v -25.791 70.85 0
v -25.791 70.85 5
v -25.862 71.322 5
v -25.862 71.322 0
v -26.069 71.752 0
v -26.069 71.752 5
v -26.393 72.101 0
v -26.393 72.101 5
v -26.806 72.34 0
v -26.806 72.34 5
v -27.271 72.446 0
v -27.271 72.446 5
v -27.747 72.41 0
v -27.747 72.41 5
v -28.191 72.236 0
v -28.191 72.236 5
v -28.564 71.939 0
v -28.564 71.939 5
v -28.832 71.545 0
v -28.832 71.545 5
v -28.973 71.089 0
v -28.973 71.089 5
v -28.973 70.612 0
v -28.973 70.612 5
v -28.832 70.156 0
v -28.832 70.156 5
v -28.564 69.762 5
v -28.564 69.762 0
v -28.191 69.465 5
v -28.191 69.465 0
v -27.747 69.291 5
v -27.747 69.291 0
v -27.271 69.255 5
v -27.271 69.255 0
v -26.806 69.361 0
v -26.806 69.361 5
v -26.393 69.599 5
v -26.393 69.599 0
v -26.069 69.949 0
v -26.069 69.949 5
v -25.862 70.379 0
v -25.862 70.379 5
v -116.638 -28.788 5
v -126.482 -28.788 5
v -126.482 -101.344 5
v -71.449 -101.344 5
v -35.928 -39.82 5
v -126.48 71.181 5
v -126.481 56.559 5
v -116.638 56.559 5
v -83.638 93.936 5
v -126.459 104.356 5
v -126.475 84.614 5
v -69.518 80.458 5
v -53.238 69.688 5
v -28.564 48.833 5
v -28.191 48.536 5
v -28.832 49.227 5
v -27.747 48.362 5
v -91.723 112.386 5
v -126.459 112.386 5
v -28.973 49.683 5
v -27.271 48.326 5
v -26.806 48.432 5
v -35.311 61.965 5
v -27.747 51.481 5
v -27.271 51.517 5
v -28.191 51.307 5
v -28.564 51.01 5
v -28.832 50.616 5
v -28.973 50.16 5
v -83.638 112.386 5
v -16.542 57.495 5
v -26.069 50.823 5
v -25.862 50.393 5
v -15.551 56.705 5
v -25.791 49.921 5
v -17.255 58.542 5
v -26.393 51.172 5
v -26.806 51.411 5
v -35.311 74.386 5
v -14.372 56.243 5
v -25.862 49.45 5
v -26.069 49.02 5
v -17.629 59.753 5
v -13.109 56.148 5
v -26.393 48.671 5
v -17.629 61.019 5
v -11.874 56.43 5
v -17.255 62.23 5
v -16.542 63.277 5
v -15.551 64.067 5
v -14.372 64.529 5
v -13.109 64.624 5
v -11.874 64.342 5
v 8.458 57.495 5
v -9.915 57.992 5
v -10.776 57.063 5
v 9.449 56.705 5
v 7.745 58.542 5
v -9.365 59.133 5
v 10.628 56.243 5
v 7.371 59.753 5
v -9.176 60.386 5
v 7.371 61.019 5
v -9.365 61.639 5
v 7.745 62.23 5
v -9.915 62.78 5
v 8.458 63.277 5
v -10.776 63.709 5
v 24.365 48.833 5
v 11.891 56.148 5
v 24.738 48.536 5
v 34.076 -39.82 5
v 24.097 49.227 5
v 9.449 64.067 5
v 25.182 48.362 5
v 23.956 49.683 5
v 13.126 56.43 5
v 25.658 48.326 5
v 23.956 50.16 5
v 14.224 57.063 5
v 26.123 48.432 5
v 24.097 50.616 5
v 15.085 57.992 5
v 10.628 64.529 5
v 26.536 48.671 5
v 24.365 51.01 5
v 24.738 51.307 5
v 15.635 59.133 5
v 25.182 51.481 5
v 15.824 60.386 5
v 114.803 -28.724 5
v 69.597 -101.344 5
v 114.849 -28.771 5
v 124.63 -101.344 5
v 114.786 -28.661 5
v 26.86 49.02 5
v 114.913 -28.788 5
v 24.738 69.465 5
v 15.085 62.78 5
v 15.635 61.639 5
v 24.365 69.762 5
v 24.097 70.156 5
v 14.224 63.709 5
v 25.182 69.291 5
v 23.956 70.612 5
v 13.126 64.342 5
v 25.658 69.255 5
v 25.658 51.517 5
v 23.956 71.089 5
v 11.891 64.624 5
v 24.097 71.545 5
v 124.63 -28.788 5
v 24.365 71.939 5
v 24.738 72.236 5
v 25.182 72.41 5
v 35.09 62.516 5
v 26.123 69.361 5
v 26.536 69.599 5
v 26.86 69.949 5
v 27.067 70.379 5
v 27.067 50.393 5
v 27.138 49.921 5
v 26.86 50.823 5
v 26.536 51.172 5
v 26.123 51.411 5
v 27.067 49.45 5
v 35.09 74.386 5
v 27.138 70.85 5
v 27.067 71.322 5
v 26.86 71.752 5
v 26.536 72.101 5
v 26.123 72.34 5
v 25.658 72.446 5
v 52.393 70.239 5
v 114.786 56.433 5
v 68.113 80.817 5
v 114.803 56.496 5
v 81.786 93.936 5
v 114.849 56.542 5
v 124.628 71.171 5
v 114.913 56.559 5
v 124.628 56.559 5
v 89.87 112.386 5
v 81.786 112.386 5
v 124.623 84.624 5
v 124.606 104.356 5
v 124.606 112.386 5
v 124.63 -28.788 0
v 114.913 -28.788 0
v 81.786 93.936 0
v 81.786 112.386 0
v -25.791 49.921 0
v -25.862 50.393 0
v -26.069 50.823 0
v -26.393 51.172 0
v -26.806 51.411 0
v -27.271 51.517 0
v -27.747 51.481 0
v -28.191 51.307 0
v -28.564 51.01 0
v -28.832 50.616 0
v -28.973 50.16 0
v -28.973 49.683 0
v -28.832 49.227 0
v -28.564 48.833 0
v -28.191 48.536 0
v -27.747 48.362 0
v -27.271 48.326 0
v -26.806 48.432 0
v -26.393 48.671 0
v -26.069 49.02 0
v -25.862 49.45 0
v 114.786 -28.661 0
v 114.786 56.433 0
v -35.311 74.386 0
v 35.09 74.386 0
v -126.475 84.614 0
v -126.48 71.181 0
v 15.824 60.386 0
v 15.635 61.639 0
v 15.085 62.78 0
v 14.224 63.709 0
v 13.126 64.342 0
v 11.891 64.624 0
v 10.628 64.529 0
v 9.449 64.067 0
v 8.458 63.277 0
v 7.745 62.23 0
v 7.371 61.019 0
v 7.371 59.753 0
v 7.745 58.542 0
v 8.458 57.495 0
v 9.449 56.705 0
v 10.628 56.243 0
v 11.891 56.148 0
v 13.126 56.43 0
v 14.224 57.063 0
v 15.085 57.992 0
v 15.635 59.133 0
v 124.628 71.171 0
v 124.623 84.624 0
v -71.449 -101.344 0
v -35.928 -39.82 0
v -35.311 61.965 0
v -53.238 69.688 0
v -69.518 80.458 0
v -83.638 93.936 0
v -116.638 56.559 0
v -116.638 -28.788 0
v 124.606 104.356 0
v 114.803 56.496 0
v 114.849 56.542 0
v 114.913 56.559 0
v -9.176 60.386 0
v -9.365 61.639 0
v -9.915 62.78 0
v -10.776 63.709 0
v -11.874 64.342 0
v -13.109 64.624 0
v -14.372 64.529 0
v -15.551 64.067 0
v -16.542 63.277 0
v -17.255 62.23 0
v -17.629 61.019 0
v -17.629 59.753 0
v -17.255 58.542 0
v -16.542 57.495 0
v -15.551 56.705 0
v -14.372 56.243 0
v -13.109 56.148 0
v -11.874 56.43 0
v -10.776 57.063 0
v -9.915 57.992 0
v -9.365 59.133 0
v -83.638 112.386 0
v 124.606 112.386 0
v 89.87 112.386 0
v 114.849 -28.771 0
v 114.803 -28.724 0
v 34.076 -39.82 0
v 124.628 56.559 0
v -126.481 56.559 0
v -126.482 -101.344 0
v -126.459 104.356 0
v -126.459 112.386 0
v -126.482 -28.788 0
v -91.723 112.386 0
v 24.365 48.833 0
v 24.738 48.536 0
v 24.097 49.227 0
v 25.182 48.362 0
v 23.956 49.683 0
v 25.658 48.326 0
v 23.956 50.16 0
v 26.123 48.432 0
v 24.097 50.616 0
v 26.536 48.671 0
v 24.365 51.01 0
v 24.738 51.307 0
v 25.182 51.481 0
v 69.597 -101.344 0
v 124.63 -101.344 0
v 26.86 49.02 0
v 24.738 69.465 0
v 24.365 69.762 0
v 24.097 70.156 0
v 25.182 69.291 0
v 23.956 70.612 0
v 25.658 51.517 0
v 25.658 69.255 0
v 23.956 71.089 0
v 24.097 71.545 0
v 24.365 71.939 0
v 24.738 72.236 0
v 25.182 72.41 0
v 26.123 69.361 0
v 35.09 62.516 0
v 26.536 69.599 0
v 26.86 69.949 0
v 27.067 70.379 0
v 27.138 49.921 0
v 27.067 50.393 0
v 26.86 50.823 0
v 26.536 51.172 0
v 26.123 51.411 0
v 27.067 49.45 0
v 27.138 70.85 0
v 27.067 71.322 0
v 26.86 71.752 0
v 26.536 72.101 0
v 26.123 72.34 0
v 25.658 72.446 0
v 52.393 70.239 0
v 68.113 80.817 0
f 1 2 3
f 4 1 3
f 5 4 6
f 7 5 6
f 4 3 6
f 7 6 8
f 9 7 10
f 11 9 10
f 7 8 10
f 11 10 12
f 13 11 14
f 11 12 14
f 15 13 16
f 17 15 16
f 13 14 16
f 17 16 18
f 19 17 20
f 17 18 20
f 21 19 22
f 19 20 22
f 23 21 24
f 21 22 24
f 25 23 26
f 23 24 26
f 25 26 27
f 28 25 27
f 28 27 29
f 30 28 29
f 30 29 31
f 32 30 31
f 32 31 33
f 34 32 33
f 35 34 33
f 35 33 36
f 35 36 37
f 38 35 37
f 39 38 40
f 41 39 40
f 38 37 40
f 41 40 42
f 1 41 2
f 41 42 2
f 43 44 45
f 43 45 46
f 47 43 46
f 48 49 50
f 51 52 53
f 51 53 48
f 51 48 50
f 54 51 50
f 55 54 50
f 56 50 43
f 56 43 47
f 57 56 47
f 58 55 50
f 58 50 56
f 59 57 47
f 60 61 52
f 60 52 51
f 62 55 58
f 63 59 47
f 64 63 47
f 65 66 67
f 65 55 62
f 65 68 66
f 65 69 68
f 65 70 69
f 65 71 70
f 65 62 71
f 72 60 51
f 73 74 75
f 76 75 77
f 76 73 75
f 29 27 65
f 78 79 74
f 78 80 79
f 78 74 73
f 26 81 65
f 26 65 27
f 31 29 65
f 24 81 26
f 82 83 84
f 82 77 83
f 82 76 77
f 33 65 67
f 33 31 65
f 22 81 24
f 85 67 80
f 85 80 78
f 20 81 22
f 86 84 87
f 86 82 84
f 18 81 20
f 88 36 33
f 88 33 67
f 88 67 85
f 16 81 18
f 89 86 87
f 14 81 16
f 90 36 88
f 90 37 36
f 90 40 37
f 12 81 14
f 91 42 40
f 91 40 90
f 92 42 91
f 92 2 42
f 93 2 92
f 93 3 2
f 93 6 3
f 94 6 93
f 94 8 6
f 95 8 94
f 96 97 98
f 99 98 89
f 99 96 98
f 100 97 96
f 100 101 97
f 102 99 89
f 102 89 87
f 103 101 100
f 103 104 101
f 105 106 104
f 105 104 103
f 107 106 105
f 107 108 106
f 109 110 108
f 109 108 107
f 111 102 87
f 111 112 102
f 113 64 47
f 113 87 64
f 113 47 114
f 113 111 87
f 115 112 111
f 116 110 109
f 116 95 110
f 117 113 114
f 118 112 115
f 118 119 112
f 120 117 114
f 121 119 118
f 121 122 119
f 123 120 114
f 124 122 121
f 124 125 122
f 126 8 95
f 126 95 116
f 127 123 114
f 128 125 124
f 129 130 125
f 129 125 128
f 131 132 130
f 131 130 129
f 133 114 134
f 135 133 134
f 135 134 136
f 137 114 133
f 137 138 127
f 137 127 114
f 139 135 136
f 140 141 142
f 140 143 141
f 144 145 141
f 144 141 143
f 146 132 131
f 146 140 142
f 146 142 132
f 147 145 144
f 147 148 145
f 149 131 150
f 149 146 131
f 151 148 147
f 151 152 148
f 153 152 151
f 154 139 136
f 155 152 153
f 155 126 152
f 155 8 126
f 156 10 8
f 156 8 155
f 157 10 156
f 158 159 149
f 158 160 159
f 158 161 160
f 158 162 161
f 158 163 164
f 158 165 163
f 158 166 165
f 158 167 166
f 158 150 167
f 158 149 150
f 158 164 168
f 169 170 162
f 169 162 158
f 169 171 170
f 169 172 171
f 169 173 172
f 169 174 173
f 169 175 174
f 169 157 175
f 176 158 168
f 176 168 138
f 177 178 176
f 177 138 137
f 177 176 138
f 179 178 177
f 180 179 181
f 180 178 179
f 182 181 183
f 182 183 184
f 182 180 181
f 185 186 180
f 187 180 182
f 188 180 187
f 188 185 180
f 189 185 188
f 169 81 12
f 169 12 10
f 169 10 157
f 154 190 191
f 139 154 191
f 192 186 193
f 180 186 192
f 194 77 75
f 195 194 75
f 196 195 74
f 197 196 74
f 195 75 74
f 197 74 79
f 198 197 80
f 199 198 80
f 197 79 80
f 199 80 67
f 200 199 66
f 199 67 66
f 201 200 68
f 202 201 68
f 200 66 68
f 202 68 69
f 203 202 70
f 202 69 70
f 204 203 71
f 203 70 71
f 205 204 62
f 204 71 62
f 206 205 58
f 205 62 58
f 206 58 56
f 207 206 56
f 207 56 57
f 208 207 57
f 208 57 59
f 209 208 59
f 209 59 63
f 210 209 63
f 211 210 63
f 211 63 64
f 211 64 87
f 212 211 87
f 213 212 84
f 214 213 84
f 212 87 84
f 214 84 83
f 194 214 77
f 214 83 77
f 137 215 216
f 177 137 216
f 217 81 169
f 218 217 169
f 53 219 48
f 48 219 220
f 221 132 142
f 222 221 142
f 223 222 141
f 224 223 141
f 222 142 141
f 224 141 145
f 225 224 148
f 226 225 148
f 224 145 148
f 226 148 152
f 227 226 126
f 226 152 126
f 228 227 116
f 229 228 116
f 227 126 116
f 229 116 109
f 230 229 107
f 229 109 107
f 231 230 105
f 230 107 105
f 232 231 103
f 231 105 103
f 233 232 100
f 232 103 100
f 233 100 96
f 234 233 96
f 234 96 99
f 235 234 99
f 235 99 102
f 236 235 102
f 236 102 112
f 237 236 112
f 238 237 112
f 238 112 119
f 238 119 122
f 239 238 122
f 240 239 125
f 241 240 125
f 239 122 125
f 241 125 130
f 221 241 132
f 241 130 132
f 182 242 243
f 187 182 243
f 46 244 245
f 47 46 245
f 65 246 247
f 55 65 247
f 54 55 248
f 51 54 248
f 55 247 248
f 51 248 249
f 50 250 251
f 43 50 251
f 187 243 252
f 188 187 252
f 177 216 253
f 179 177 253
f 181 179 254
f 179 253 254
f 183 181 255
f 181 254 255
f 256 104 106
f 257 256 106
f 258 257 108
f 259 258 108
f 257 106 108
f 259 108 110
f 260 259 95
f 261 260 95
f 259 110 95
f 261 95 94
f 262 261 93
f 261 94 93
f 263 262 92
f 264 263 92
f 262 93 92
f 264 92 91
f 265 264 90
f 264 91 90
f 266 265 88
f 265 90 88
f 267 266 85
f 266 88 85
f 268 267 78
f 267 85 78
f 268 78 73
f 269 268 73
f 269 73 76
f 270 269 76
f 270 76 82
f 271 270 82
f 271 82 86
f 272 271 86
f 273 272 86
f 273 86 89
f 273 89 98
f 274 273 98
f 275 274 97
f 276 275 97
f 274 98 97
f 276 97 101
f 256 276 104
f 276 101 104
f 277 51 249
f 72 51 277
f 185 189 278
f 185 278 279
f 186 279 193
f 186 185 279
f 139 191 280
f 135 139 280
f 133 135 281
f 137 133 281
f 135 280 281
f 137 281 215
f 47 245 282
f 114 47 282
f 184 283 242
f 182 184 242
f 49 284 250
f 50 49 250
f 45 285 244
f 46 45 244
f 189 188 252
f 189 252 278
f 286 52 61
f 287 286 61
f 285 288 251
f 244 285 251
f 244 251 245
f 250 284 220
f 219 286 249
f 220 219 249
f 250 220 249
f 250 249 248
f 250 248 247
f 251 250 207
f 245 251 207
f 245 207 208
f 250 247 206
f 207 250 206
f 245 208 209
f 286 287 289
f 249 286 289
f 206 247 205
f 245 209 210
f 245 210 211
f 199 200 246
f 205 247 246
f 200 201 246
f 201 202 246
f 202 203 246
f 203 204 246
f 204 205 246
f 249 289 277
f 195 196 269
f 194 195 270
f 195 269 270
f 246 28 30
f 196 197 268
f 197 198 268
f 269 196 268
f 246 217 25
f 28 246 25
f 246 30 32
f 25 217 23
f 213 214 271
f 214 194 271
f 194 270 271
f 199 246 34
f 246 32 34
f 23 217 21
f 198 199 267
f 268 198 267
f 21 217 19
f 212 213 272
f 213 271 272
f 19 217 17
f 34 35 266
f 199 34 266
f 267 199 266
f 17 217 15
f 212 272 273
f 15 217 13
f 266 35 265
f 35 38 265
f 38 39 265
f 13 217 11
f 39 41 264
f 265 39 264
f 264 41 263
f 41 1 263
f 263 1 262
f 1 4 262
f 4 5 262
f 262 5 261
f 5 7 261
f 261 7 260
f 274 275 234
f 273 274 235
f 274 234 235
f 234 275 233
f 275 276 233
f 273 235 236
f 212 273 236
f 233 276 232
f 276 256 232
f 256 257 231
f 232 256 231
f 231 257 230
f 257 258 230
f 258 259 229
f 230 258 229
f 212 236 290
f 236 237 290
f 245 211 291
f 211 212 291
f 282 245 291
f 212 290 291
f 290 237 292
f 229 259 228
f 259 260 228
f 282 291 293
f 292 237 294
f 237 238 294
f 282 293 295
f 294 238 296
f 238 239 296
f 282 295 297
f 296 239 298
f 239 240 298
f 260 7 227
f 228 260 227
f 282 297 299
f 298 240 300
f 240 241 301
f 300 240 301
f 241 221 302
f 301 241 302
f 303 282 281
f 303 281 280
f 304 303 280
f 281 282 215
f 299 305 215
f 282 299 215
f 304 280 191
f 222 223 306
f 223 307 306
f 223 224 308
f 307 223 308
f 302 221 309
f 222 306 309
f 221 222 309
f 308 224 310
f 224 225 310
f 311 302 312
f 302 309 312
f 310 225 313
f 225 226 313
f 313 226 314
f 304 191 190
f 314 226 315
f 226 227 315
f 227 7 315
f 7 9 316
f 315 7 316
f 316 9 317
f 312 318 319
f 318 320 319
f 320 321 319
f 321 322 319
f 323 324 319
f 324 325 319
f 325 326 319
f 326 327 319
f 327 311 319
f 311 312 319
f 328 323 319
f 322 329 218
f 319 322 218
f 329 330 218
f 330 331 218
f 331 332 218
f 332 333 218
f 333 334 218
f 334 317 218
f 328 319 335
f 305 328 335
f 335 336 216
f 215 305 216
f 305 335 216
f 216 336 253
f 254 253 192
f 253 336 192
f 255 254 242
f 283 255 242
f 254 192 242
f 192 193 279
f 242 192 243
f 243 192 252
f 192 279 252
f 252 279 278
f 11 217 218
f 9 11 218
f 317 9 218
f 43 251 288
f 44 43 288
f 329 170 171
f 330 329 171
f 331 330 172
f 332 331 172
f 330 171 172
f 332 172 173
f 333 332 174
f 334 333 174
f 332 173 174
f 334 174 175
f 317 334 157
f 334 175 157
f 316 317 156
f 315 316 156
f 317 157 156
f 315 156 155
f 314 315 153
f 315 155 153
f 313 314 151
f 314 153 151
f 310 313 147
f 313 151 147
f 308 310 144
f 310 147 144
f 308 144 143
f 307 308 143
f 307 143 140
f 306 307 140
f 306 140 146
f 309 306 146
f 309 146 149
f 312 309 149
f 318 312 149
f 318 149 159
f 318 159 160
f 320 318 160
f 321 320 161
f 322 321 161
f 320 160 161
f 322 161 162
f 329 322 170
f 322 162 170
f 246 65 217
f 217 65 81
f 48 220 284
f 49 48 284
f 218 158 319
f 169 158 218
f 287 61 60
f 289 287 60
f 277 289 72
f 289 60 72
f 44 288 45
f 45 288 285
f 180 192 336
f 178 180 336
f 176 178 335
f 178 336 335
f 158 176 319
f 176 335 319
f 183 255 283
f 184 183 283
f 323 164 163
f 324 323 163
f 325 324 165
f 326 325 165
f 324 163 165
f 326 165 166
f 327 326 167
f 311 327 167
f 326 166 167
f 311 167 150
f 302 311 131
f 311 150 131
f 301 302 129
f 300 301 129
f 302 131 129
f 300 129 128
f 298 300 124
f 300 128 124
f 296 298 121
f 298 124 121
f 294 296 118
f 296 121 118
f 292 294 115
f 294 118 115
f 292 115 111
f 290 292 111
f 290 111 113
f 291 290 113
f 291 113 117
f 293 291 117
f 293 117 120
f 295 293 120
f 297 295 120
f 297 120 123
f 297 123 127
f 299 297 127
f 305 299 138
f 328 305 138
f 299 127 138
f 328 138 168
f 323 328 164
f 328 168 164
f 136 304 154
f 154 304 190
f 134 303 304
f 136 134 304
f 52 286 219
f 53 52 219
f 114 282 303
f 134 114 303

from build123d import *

# Parameters (mm, degrees)
BOSS_EXTRUDE1_DEPTH = 5
SKETCH2_W           = 70.400327135
SKETCH2_H           = 34
SKETCH2_R           = 1.6
SKETCH2_R_2         = 4.25
BOSS_EXTRUDE2_DEPTH = 5
SKETCH3_W           = 34.735720487
SKETCH3_H           = 8.029761027
BOSS_EXTRUDE3_DEPTH = 5
BOSS_EXTRUDE4_DEPTH = 5


with BuildPart() as part:
    # Sketch1 → Boss-Extrude1 (new body)
    with BuildSketch(Plane.XY):
        with BuildLine():
            Line((-91.722809189, 104.356193097), (-126.458529676, 104.356193097))
            Line((-126.458529676, 104.356193097), (-126.475267186, 84.614358359))
            Line((-126.475267186, 84.614358359), (-126.480371779, 71.180735955))
            Line((-126.480371779, 71.180735955), (-126.480681684, 56.559478315))
            Line((-126.480681684, 56.559478315), (-116.63815349, 56.559478315))
            Line((-116.63815349, 56.559478315), (-116.63815349, -28.787570067))
            Line((-116.63815349, -28.787570067), (-126.481949379, -28.787570067))
            Line((-126.481949379, -28.787570067), (-126.481949379, -101.34405192))
            Line((-126.481949379, -101.34405192), (-71.448987089, -101.34405192))
            Line((-71.448987089, -101.34405192), (-35.928248301, -39.820327617))
            Line((-35.928248301, -39.820327617), (34.075825089, -39.820327617))
            Line((34.075825089, -39.820327617), (69.596563877, -101.34405192))
            Line((69.596563877, -101.34405192), (124.629526167, -101.34405192))
            Line((124.629526167, -101.34405192), (124.629526167, -28.787570067))
            Line((124.629526167, -28.787570067), (114.912707304, -28.787570067))
            ThreePointArc((114.912707304, -28.787570067), (114.822920988, -28.750379358), (114.785730279, -28.660593042))
            Line((114.785730279, -28.660593042), (114.785730279, 56.432501289))
            ThreePointArc((114.785730279, 56.432501289), (114.822920988, 56.522287605), (114.912707304, 56.559478315))
            Line((114.912707304, 56.559478315), (124.628258473, 56.559478315))
            Line((124.628258473, 56.559478315), (124.627948781, 71.170673702))
            Line((124.627948781, 71.170673702), (124.622835448, 84.62441506))
            Line((124.622835448, 84.62441506), (124.606106464, 104.356193097))
            Line((124.606106464, 104.356193097), (89.870385977, 104.356193097))
            ThreePointArc((89.870385977, 104.356193097), (65.84204117, 79.034177757), (35.089604597, 62.515901216))
            Line((35.089604597, 62.515901216), (35.089604597, 40.385954124))
            Line((35.089604597, 40.385954124), (-35.310722538, 40.385954124))
            Line((-35.310722538, 40.385954124), (-35.310722538, 61.964889462))
            ThreePointArc((-35.310722538, 61.964889462), (-67.008229873, 78.514287134), (-91.722809189, 104.356193097))
        make_face()
    extrude(amount=BOSS_EXTRUDE1_DEPTH)

    # Sketch2 → Boss-Extrude2 (add)
    with BuildSketch(Plane.XY.offset(5)):
        with Locations((-0.11055897, 57.385954124)):
            Rectangle(SKETCH2_W, SKETCH2_H)
        with Locations((-27.3906777, 70.850420218)):
            Circle(SKETCH2_R, mode=Mode.SUBTRACT)
        with Locations((-27.3906777, 49.92148803)):
            Circle(SKETCH2_R, mode=Mode.SUBTRACT)
        with Locations((25.538254488, 49.92148803)):
            Circle(SKETCH2_R, mode=Mode.SUBTRACT)
        with Locations((25.538254488, 70.850420218)):
            Circle(SKETCH2_R, mode=Mode.SUBTRACT)
        with Locations((-13.426211606, 60.385954124)):
            Circle(SKETCH2_R_2, mode=Mode.SUBTRACT)
        with Locations((11.573788394, 60.385954124)):
            Circle(SKETCH2_R_2, mode=Mode.SUBTRACT)
    extrude(amount=-BOSS_EXTRUDE2_DEPTH)

    # Sketch3 → Boss-Extrude3 (add)
    with BuildSketch(Plane.XY.offset(5)):
        with Locations((-109.090669433, 108.371073611)):
            Rectangle(SKETCH3_W, SKETCH3_H)
        with Locations((107.238246221, 108.371073611)):
            Rectangle(SKETCH3_W, SKETCH3_H)
    extrude(amount=-BOSS_EXTRUDE3_DEPTH)

    # Sketch4 → Boss-Extrude4 (add)
    with BuildSketch(Plane.XY.offset(5)):
        with BuildLine():
            Line((89.870385977, 112.385954124), (81.785730279, 112.385954124))
            Line((81.785730279, 112.385954124), (81.785730279, 93.935580042))
            ThreePointArc((81.785730279, 93.935580042), (85.984378147, 99.024608337), (89.870385977, 104.356193097))
            Line((89.870385977, 104.356193097), (89.870385977, 112.385954124))
        make_face()
        with BuildLine():
            Line((-91.722809189, 112.385954124), (-91.722809189, 104.356193097))
            ThreePointArc((-91.722809189, 104.356193097), (-87.836801358, 99.024608337), (-83.63815349, 93.935580042))
            Line((-83.63815349, 93.935580042), (-83.63815349, 112.385954124))
            Line((-83.63815349, 112.385954124), (-91.722809189, 112.385954124))
        make_face()
    extrude(amount=-BOSS_EXTRUDE4_DEPTH)


solid = part.part
